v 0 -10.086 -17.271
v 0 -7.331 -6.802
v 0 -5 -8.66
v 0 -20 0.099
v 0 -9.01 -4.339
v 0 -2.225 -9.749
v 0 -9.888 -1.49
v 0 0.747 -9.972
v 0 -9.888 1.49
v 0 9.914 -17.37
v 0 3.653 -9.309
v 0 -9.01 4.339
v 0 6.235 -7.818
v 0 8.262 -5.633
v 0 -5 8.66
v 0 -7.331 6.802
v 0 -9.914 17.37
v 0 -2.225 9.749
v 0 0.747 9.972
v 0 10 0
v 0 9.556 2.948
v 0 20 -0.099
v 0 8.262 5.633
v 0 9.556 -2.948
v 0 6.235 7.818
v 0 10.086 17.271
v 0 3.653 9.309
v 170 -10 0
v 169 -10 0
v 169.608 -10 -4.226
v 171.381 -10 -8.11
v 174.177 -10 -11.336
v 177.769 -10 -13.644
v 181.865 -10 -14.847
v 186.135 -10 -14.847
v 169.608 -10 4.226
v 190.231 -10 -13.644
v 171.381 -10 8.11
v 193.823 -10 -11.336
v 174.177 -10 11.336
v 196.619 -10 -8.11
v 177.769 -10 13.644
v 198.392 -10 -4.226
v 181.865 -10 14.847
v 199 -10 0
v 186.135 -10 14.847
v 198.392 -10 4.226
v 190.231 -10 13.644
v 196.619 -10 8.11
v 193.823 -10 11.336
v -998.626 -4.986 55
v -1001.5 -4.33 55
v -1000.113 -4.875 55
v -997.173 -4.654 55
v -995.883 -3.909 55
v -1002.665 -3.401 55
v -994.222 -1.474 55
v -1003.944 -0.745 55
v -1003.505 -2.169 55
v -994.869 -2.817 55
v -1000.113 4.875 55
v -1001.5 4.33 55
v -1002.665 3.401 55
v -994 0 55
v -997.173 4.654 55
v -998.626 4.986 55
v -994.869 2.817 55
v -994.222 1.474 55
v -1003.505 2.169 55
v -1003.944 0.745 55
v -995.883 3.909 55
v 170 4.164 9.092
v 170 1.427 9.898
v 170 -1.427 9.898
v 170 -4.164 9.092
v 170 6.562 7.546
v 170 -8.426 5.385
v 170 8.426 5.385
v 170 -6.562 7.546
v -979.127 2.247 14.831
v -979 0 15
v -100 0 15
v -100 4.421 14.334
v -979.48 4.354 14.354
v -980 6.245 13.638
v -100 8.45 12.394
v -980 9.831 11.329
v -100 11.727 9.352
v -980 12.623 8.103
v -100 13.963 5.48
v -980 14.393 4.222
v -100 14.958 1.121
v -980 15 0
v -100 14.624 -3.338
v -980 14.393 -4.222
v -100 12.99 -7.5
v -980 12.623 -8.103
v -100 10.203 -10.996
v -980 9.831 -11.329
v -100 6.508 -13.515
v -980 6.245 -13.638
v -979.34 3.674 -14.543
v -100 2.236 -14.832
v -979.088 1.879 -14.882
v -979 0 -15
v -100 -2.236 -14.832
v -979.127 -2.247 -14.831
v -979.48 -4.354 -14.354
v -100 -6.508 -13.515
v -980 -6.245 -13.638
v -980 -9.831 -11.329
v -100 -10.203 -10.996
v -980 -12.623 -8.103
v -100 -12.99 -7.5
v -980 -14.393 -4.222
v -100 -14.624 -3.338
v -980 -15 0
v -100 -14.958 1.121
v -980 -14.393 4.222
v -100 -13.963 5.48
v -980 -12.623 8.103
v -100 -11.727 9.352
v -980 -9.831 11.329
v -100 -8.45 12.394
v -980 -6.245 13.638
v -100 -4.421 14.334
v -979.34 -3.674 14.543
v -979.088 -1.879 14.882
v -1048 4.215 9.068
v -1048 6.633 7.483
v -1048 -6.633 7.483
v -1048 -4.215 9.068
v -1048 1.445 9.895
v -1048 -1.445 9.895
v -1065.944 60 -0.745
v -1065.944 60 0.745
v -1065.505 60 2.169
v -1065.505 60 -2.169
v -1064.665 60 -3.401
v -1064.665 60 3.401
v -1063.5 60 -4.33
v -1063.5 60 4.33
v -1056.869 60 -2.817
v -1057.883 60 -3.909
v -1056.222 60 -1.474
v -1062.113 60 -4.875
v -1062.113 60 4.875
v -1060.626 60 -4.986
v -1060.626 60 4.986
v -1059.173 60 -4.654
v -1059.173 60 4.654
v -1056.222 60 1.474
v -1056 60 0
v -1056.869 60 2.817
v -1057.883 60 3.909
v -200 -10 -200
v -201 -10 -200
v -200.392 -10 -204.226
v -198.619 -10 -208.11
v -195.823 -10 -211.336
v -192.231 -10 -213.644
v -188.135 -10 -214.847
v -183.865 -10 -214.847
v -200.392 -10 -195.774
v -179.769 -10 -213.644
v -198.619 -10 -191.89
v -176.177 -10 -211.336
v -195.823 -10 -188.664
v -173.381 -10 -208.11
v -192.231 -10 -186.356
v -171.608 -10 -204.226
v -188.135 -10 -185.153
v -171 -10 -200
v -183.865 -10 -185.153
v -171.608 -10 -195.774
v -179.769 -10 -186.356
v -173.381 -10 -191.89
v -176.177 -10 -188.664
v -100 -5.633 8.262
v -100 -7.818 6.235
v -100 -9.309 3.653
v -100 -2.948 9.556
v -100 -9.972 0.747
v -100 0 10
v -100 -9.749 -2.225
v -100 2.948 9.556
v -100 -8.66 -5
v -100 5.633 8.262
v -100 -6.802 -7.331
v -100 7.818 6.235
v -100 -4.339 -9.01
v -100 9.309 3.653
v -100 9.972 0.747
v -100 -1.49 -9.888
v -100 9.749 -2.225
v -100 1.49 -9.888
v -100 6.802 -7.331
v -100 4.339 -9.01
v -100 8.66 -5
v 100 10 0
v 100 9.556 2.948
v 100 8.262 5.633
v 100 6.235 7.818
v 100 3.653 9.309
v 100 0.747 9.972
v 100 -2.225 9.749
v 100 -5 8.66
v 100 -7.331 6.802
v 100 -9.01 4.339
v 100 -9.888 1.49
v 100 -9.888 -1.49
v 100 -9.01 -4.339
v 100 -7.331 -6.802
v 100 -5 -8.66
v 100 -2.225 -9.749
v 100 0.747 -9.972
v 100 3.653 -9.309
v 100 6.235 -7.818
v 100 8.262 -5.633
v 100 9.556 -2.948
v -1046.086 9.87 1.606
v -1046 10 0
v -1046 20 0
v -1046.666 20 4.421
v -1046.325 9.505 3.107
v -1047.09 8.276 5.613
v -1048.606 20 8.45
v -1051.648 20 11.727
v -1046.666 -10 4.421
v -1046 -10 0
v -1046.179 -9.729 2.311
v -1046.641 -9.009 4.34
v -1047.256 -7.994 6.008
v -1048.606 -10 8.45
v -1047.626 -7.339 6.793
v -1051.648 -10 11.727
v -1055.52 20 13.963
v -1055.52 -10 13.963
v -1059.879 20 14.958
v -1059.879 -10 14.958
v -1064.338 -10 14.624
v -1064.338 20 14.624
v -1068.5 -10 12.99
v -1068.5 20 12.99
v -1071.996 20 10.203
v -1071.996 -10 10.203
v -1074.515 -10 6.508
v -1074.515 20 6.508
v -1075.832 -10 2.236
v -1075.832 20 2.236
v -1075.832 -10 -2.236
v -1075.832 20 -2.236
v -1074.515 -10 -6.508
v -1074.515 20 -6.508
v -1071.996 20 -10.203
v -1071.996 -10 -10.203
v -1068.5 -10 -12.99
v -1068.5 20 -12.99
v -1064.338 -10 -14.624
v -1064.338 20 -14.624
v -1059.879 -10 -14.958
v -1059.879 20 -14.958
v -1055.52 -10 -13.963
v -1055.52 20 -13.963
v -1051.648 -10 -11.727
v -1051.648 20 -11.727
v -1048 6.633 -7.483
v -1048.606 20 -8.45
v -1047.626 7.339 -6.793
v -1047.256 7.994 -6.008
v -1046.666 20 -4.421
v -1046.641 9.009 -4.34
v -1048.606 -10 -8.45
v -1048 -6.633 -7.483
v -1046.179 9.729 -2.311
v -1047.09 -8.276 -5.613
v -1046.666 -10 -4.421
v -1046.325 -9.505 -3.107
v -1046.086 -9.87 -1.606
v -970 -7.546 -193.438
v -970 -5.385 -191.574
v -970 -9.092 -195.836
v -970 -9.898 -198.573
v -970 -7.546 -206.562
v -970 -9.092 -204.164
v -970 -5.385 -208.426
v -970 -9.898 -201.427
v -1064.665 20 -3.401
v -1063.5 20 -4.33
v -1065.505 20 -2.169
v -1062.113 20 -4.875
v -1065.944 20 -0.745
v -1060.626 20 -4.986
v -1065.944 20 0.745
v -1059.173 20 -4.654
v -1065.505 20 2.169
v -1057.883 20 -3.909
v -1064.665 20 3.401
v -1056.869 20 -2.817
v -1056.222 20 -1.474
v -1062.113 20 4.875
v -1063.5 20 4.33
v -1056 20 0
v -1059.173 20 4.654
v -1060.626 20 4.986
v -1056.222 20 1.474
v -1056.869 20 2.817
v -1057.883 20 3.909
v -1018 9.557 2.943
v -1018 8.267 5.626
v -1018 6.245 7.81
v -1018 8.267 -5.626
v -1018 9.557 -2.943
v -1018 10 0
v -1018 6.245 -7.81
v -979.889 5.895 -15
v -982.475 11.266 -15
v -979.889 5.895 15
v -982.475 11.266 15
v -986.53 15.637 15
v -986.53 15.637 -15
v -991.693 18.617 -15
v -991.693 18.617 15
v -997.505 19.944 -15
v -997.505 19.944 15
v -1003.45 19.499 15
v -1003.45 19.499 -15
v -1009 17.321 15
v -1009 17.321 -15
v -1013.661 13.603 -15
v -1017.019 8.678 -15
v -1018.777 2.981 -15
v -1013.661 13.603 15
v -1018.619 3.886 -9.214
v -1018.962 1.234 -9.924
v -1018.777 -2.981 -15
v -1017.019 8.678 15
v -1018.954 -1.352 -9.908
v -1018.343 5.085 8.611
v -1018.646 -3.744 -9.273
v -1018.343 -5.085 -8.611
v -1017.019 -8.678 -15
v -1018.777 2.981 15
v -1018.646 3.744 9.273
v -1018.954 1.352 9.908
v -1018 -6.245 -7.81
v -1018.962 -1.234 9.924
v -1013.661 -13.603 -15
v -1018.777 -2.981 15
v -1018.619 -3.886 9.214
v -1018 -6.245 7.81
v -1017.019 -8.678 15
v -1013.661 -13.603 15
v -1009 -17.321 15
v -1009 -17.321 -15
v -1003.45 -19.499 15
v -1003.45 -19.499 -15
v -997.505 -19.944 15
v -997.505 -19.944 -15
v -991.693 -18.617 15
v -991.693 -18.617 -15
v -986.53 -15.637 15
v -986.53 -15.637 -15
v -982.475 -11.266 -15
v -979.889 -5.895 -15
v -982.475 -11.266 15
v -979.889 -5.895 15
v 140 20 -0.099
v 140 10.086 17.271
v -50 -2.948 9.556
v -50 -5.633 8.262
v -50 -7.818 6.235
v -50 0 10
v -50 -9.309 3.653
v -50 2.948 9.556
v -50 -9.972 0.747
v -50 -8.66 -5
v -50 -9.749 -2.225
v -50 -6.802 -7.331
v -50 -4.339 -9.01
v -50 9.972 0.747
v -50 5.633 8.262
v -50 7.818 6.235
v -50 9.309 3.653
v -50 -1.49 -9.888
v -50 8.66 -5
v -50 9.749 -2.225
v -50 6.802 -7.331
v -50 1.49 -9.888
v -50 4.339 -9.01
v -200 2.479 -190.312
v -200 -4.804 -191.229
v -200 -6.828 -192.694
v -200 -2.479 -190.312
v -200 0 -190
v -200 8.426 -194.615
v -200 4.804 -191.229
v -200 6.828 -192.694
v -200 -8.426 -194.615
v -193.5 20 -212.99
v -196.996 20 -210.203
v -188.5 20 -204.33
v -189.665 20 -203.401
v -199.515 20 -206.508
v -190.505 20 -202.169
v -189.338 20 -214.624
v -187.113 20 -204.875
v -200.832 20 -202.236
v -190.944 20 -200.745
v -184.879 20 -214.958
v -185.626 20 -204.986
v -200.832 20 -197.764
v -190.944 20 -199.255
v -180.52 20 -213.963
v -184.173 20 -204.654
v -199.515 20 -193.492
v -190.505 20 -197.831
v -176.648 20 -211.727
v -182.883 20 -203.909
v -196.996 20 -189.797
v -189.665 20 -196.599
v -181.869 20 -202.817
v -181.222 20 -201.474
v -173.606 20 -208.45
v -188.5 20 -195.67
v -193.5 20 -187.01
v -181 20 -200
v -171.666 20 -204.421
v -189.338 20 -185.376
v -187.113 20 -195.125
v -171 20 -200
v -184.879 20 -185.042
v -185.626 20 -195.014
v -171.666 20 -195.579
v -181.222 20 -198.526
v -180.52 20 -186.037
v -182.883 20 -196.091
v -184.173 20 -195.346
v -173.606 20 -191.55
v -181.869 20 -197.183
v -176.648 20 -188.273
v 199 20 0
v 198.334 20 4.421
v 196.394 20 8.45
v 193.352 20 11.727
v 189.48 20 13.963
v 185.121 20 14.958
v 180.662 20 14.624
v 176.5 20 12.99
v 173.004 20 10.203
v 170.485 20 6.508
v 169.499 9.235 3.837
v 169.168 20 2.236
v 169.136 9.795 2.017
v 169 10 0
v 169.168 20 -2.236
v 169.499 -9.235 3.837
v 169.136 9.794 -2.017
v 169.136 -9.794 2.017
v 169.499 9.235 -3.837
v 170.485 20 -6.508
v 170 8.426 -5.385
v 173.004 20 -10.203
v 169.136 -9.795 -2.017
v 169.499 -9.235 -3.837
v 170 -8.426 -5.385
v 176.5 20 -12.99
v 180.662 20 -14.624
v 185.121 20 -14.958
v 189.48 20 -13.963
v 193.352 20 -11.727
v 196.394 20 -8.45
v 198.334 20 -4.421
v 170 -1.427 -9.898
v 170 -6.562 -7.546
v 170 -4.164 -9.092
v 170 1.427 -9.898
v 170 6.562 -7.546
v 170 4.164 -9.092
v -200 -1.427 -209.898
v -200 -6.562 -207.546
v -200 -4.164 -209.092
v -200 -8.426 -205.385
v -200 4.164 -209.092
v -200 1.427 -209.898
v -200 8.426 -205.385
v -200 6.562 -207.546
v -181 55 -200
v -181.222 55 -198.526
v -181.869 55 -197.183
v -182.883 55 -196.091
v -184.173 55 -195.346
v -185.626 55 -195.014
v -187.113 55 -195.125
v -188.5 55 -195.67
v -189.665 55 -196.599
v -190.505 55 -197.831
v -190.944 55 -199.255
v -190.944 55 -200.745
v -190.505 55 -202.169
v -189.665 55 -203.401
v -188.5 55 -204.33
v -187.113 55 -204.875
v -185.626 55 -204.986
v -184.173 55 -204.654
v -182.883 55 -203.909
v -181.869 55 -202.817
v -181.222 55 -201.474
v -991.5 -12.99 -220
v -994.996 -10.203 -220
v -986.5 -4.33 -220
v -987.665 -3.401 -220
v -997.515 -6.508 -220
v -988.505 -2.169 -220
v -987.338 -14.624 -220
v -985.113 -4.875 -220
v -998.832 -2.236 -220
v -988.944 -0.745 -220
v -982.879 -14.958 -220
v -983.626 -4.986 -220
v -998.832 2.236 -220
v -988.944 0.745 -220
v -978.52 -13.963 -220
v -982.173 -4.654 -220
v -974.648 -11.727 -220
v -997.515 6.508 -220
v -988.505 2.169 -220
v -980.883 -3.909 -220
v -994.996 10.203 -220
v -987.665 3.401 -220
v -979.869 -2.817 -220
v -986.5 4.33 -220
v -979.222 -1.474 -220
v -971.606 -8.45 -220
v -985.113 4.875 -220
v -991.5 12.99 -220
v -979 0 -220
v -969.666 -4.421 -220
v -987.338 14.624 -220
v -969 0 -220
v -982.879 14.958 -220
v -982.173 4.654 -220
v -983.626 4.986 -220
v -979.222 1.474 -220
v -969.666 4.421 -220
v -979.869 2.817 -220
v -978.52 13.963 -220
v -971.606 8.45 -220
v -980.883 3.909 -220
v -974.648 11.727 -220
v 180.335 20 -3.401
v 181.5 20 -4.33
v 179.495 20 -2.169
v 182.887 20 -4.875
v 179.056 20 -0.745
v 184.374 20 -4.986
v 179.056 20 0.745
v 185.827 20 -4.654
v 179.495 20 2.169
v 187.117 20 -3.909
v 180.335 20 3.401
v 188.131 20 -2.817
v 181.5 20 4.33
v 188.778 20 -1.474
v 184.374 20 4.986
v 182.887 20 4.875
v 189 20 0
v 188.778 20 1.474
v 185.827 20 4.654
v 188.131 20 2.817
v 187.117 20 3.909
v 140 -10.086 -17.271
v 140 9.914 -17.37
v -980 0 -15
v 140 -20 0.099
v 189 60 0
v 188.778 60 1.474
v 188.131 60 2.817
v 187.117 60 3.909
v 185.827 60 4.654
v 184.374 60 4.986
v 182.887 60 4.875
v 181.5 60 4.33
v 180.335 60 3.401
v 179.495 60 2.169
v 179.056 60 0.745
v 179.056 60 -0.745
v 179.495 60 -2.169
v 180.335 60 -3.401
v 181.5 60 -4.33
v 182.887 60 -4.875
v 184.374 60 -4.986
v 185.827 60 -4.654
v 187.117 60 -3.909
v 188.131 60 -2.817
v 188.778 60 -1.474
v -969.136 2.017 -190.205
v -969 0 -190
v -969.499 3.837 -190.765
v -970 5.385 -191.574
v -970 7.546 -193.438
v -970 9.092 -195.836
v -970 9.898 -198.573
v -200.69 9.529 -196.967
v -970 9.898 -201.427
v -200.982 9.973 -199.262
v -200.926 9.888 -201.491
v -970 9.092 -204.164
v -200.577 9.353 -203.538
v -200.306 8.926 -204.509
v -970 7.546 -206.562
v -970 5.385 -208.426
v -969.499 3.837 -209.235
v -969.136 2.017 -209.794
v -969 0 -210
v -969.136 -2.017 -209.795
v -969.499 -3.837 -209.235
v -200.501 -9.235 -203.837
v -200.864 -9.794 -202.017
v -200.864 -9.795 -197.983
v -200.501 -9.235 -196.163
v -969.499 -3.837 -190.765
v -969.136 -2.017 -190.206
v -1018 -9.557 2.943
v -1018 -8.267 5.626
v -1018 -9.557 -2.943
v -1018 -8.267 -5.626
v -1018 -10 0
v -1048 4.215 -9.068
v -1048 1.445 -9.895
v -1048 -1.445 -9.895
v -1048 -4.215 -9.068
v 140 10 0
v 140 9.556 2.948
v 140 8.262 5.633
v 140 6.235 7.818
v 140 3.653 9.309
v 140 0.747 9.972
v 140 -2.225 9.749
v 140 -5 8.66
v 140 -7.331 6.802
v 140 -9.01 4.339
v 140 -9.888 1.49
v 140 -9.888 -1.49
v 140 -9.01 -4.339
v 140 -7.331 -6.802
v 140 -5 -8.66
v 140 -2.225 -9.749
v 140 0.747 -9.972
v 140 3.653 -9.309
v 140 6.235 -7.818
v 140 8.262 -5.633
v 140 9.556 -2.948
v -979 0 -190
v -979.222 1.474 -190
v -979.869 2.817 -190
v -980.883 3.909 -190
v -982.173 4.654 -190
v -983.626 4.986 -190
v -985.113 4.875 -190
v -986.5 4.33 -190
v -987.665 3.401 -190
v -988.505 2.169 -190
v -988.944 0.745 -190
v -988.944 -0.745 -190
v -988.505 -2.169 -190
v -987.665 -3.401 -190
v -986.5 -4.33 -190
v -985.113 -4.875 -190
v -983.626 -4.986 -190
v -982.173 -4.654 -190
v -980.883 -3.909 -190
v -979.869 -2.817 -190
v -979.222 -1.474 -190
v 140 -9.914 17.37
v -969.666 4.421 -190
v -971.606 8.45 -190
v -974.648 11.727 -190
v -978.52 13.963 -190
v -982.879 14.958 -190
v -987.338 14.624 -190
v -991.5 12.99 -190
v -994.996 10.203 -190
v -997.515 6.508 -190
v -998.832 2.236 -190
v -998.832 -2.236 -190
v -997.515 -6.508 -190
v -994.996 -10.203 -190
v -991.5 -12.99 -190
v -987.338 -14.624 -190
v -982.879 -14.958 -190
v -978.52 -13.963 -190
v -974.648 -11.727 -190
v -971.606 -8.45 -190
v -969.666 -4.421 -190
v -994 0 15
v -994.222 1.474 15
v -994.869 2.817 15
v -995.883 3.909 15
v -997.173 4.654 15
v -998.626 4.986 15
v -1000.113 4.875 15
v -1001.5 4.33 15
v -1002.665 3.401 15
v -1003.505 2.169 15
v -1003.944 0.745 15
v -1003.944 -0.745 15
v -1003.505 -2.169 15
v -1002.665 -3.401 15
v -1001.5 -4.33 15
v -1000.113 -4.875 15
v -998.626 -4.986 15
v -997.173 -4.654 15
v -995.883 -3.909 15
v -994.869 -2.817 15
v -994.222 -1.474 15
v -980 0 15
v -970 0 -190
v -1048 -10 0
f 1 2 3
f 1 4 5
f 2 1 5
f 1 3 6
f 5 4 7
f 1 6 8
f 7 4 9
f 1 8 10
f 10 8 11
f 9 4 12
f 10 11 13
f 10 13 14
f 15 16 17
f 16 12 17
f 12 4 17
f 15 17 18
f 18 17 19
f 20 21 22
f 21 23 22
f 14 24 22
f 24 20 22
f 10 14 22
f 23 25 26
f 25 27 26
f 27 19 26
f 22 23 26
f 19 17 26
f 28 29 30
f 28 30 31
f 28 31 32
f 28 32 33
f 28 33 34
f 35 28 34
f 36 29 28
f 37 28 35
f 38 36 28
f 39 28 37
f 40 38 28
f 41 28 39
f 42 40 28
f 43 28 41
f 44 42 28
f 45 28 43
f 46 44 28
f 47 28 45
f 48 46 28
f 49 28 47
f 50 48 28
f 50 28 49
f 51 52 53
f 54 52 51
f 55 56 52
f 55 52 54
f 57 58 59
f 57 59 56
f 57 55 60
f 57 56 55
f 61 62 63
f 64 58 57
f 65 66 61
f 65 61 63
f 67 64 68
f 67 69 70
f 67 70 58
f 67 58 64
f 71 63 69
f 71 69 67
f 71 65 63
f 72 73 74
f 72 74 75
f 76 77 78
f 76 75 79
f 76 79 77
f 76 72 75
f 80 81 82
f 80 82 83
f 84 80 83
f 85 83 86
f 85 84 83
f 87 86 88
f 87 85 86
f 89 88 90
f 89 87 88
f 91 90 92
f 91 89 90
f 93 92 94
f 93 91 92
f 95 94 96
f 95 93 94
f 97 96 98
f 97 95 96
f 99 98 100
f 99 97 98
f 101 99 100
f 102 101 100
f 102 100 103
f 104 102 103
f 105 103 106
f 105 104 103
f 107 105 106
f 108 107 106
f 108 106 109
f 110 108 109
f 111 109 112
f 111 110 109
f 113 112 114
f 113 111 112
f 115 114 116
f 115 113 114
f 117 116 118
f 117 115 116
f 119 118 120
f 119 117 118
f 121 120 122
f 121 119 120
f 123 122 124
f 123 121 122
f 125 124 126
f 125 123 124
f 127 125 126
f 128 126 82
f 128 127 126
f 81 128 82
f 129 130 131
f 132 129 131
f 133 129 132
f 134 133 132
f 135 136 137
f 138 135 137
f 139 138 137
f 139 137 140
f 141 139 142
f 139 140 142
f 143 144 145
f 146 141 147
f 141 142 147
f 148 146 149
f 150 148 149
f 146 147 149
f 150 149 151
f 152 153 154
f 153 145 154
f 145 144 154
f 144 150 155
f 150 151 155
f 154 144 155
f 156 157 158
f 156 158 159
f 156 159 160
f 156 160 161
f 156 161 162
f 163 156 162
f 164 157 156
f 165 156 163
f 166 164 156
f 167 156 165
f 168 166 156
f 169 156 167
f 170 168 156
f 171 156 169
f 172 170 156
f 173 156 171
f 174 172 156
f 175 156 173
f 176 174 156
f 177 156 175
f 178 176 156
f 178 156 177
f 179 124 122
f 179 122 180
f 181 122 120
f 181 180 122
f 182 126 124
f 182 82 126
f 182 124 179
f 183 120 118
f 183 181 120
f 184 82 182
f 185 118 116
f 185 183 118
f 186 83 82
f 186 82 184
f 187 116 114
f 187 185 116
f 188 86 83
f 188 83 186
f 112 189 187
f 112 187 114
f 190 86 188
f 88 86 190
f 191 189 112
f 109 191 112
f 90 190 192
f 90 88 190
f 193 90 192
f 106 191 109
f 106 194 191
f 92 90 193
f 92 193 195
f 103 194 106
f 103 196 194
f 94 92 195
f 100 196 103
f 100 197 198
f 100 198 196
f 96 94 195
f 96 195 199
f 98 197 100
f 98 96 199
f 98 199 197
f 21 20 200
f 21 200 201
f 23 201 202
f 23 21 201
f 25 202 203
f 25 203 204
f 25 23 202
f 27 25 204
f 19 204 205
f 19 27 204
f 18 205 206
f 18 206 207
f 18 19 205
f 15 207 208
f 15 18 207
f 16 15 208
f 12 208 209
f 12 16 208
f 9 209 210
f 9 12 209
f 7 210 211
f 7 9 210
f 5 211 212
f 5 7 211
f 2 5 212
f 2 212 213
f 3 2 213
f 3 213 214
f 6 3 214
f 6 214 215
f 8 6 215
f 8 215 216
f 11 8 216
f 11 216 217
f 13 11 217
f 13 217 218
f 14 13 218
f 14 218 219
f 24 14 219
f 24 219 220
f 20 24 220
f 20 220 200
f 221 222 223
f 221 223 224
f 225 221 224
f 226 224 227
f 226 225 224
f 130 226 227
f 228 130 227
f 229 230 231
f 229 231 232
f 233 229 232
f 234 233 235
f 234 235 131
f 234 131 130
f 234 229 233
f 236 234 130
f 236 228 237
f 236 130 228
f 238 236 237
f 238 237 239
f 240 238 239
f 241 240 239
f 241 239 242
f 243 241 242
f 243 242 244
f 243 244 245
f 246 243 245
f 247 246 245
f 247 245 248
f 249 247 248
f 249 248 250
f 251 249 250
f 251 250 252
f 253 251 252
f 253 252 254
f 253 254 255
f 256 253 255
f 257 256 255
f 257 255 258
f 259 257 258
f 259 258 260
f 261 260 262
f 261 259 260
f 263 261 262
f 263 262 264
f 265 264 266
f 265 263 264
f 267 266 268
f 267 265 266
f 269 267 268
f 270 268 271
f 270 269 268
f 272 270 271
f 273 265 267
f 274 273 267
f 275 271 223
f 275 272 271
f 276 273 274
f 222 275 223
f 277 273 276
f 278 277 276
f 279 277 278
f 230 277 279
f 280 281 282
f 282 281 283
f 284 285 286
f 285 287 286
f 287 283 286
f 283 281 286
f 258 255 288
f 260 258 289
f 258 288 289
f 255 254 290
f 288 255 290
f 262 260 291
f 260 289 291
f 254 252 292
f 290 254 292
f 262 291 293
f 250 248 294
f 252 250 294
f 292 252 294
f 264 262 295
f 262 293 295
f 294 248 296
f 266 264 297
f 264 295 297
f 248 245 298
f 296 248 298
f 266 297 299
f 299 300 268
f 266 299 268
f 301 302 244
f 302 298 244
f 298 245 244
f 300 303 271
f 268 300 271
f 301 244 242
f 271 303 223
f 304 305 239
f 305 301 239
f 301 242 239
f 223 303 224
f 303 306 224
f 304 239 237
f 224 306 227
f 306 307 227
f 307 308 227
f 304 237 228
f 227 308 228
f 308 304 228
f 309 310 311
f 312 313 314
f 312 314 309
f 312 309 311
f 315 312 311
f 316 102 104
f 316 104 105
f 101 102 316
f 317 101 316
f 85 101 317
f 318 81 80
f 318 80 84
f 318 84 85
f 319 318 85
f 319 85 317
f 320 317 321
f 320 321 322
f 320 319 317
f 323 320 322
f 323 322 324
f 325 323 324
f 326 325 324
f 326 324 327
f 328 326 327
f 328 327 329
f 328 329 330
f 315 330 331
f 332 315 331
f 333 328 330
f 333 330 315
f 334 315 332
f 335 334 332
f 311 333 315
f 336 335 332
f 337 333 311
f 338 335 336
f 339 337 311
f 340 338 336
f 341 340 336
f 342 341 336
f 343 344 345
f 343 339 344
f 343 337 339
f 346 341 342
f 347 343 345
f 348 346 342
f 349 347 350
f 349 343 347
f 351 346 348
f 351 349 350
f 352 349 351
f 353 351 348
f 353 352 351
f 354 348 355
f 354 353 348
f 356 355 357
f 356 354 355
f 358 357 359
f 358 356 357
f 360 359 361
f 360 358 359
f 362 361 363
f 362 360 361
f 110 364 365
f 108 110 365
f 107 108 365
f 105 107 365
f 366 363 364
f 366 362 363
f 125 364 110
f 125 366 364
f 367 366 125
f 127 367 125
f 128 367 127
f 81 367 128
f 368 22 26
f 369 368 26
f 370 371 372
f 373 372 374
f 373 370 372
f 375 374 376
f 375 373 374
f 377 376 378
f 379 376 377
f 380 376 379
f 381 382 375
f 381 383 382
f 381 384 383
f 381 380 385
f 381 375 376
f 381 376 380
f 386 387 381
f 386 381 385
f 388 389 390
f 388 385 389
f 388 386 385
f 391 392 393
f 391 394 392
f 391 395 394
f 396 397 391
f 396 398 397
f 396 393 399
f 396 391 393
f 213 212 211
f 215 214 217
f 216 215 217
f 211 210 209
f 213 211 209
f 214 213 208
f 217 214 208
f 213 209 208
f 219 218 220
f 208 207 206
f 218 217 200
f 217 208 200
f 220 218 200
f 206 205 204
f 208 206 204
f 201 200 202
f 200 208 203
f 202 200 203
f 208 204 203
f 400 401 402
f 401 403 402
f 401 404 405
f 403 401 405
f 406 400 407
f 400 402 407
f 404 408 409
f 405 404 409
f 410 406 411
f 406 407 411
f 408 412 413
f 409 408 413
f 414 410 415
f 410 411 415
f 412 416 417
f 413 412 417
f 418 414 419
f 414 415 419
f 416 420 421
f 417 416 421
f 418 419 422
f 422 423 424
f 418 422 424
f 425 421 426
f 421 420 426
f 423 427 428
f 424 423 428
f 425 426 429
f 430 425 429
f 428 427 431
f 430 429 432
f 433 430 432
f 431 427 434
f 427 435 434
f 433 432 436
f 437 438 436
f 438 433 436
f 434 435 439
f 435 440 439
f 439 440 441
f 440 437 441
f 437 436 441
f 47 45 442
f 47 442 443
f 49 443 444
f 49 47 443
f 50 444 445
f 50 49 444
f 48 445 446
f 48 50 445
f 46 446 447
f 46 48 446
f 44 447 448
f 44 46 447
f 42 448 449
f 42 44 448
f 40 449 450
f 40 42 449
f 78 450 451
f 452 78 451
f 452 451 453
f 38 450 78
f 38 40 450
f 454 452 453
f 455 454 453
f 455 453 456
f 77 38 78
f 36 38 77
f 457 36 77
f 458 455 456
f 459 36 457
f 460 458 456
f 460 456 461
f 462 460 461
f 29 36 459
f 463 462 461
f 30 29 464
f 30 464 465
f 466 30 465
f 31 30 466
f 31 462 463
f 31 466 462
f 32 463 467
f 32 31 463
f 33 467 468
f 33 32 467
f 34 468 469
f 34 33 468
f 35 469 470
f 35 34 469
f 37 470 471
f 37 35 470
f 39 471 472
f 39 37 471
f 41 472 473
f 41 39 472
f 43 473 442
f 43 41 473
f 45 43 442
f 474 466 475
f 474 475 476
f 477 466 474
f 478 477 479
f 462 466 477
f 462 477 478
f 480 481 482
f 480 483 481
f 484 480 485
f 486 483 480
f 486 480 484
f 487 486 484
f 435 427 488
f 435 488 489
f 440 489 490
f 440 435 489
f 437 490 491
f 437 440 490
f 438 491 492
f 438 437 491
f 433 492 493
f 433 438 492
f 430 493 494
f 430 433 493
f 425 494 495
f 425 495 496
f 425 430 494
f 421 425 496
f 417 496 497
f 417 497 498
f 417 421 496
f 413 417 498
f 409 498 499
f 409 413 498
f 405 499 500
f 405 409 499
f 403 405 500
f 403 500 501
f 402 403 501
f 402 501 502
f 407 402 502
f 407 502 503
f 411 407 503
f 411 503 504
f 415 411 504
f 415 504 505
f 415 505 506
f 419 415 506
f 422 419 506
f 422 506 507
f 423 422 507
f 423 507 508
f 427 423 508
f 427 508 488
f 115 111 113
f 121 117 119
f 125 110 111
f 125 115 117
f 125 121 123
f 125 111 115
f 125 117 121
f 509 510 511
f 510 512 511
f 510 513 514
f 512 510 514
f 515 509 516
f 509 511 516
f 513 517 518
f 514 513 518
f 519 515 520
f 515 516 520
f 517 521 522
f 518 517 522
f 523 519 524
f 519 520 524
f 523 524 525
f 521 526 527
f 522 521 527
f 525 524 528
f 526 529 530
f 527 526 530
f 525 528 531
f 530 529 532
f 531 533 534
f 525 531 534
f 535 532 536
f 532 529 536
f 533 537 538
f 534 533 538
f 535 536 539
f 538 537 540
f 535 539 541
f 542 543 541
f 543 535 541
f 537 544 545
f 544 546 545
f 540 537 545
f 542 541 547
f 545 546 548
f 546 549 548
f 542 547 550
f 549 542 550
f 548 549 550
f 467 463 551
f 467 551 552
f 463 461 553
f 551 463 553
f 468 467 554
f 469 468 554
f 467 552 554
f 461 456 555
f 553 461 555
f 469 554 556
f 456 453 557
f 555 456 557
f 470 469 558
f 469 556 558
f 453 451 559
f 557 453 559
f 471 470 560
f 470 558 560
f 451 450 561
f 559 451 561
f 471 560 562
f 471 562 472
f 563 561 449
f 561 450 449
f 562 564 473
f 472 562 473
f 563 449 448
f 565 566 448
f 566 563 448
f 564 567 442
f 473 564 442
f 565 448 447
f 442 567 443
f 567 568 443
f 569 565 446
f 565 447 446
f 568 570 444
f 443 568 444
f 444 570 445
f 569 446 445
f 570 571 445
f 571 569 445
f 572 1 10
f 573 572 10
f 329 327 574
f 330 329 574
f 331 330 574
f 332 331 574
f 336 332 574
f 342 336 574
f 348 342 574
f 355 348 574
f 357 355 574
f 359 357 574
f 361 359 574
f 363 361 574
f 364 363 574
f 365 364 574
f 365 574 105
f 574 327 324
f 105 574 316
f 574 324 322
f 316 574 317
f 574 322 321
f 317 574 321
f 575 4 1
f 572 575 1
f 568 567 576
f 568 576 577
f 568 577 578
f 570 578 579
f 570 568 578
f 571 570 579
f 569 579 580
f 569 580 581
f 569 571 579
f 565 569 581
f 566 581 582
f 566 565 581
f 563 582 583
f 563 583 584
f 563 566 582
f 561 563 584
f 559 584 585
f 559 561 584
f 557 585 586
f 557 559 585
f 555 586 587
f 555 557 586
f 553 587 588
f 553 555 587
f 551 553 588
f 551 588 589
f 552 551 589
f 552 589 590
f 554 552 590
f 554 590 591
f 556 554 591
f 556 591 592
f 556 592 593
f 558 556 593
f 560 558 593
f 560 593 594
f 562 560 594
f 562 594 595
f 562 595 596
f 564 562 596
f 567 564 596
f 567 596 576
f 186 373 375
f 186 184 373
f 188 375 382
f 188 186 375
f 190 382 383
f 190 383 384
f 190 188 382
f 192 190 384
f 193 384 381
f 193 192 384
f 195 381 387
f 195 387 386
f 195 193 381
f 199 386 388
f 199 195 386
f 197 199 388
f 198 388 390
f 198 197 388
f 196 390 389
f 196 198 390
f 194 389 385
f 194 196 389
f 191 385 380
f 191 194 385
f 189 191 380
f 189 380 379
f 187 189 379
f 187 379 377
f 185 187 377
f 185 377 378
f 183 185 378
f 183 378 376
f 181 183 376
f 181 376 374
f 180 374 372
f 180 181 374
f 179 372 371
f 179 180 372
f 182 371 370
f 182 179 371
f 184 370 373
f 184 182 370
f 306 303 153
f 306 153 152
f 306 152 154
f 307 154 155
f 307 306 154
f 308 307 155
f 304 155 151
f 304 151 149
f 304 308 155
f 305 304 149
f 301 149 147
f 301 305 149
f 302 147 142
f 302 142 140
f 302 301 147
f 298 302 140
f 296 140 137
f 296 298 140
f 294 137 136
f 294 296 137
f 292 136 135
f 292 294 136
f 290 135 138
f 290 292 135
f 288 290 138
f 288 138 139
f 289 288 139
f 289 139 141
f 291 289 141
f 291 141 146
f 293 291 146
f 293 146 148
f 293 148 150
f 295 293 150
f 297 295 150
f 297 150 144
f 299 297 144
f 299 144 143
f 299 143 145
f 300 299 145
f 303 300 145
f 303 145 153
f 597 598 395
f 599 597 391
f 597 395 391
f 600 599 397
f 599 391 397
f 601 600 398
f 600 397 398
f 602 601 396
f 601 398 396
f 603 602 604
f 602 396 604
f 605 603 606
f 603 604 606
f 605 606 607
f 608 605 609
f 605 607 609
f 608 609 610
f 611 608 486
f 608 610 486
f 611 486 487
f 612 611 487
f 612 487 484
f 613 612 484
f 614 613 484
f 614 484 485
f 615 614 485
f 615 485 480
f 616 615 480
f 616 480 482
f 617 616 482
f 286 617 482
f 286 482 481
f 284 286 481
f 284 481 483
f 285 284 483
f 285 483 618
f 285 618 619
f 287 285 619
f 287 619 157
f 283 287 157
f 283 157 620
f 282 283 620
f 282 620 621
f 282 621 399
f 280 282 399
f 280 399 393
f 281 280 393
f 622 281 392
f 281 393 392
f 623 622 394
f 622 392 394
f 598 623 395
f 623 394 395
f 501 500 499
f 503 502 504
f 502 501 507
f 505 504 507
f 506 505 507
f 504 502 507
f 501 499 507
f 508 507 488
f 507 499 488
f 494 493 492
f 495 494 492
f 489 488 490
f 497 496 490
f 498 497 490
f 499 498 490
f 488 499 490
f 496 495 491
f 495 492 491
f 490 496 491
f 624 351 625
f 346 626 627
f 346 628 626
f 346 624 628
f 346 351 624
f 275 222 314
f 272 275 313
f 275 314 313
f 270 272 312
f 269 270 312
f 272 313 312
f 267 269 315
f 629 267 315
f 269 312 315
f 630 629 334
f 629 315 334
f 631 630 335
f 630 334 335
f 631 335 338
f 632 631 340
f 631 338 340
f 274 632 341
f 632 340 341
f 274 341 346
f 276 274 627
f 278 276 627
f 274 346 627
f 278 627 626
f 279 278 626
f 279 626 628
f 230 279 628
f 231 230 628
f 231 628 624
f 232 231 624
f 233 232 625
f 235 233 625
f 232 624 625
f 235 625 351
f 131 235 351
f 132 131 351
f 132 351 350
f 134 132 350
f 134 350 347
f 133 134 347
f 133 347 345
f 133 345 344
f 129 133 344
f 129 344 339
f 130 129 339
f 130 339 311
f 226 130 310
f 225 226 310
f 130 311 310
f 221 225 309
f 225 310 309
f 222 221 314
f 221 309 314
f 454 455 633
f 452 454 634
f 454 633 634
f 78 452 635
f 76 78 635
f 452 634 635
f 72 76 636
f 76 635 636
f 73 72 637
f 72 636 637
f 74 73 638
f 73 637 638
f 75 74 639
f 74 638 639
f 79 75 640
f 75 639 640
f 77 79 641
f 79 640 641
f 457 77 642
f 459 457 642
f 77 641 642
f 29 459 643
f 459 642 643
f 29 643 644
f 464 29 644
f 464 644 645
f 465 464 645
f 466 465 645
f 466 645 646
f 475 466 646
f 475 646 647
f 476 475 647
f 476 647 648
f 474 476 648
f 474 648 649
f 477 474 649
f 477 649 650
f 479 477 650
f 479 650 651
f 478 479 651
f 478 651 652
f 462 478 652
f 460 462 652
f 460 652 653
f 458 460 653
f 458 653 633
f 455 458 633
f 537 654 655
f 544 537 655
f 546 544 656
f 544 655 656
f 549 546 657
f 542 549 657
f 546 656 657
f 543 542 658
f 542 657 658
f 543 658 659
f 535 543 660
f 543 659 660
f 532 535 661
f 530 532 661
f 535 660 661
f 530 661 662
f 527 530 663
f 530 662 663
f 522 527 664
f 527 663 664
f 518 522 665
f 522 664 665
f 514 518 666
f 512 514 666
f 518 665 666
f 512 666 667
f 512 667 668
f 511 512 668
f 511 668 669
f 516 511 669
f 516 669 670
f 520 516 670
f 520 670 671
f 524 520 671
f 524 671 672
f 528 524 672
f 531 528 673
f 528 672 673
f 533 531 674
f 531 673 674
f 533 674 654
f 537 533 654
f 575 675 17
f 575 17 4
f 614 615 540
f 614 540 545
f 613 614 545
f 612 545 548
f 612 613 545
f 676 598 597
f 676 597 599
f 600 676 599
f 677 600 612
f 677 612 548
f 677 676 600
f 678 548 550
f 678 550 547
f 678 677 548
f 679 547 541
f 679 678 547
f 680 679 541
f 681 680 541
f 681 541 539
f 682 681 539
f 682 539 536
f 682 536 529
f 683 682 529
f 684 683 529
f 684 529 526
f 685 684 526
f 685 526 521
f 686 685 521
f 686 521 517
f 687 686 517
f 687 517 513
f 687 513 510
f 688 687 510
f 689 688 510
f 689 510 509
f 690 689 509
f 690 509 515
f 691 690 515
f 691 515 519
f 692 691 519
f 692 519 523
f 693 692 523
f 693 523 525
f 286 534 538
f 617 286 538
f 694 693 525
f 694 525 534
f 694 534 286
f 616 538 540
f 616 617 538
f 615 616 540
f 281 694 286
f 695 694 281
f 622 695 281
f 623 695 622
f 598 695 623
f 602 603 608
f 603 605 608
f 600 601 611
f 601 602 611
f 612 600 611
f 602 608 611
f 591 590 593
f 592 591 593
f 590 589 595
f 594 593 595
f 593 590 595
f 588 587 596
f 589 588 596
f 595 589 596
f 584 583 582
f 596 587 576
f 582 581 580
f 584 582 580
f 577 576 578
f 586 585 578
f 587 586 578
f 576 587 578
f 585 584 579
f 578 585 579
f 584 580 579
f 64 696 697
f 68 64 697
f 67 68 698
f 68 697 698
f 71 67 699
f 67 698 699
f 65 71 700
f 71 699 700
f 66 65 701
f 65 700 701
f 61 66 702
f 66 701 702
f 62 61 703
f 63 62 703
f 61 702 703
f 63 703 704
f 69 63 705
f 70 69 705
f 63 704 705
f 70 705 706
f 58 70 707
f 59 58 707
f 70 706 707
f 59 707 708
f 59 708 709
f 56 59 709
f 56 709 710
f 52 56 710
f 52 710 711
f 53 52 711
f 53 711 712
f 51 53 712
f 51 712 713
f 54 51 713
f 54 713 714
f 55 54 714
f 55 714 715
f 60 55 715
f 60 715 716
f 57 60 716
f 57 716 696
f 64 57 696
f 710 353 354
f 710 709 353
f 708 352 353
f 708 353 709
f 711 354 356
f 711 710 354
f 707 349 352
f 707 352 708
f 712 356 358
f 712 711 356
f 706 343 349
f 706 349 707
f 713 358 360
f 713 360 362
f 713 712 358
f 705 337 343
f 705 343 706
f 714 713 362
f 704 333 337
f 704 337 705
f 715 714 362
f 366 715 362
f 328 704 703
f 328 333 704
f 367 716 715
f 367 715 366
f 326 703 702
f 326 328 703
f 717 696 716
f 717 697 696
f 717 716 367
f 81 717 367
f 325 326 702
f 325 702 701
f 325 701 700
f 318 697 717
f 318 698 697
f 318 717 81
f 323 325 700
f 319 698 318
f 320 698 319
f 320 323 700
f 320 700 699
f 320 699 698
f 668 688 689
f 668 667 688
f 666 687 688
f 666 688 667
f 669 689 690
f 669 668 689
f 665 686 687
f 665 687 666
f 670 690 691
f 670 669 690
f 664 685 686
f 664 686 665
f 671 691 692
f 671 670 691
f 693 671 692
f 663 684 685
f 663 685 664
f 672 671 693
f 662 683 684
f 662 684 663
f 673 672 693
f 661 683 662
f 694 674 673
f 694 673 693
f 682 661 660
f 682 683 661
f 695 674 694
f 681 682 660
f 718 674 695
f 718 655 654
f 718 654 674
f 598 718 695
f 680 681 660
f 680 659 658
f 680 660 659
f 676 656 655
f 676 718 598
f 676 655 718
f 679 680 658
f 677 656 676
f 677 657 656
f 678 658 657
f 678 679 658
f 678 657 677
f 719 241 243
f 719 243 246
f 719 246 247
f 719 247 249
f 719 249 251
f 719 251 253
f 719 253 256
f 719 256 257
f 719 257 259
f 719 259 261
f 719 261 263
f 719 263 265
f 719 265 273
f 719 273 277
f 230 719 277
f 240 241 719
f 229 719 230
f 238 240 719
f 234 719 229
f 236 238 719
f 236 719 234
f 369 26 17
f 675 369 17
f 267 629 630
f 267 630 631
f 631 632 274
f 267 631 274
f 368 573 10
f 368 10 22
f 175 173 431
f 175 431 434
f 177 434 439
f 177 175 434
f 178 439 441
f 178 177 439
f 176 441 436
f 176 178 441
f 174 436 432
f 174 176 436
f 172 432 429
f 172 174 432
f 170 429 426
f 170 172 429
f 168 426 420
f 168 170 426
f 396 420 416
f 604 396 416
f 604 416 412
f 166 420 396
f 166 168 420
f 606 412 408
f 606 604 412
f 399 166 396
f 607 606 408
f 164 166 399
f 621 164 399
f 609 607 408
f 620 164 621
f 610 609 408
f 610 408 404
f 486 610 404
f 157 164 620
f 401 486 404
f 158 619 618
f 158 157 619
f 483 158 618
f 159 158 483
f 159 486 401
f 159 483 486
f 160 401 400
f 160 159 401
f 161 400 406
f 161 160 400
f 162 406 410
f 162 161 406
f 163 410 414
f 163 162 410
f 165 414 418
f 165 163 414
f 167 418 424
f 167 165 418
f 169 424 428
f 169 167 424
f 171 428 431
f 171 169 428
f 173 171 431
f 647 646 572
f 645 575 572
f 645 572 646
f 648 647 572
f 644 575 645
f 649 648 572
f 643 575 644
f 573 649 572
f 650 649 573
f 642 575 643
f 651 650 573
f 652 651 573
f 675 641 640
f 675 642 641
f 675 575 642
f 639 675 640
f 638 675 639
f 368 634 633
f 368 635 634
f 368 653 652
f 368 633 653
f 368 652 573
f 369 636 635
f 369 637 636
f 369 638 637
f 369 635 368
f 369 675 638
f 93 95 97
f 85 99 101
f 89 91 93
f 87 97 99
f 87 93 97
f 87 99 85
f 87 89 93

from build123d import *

# Parameters (mm, degrees)
F0_R      = 10
F1_DEPTH  = 140
F3_R      = 10
F4_DEPTH  = 70
F7_DEPTH  = 30
F9_DEPTH  = 60
F13_R     = 20
F14_DEPTH = 30
F15_R     = 5
F16_DEPTH = 55
F17_W     = 30
F17_H     = 10
F19_R     = 15
F20_DEPTH = 30
F21_R     = 5
F22_DEPTH = 60
F23_W     = 770
F23_H     = 10
F25_R     = 15
F26_DEPTH = 30
F27_R     = 5
F28_DEPTH = 55
F30_R     = 15
F30_R_2   = 5
F31_DEPTH = 30


with BuildPart() as f1:
    # F0 (on Right) → F1 (new body)
    with BuildSketch(Plane.YZ):
        Polygon((19.9997544387, -0.0991079843), (10.0857072515, 17.2707414212), (-9.9140471872, 17.3698494055), (-19.9997544387, 0.0991079843), (-10.0857072515, -17.2707414212), (9.9140471872, -17.3698494055), align=None)
        Circle(F0_R, mode=Mode.SUBTRACT)
    extrude(amount=F1_DEPTH)

    # F3 (on offset) → F4 (join)
    with BuildSketch(Plane.YZ.offset(100)):
        Circle(F3_R)
    extrude(amount=F4_DEPTH)

    # F6 (on offset) → F7 (join)
    with BuildSketch(Plane.XZ.offset(10)):
        with BuildLine():
            ThreePointArc((169, 0), (184, -15), (199, 0))
            ThreePointArc((199, 0), (184, 15), (169, 0))
        make_face()
    extrude(amount=-F7_DEPTH)

    # F8 (on Front) → F9 (join)
    with BuildSketch(Plane.XZ):
        with BuildLine():
            ThreePointArc((179, 0), (184, -5), (189, 0))
            ThreePointArc((189, 0), (184, 5), (179, 0))
        make_face()
    extrude(amount=-F9_DEPTH)


with BuildPart() as f11:
    # F10 (on Front) → F11 (revolve)
    with BuildSketch(Plane.XZ):
        Polygon((-980, 0), (-50, 0), (-50, 10), (-100, 10), (-100, 15), (-980, 15), align=None)
    revolve(axis=Axis((-515, 0, 0), (-1, 0, 0)))

    # F13 (on offset) → F14 (join)
    with BuildSketch(Plane.XY.offset(15)):
        with Locations((-999, 0)):
            Circle(F13_R)
    extrude(amount=-F14_DEPTH)

    # F15 (on Top) → F16 (join)
    with BuildSketch(Plane.XY):
        with Locations((-999, 0)):
            Circle(F15_R)
    extrude(amount=F16_DEPTH)

    # F17 (on Top) → F18 (revolve)
    with BuildSketch(Plane.XY):
        with Locations((-1033, 5)):
            Rectangle(F17_W, F17_H)
    revolve(axis=Axis((-1033, 0, 0), (-1, 0, 0)))

    # F19 (on offset) → F20 (join)
    with BuildSketch(Plane.XZ.offset(10)):
        with Locations((-1061, 0)):
            Circle(F19_R)
    extrude(amount=-F20_DEPTH)

    # F21 (on Front) → F22 (join)
    with BuildSketch(Plane.XZ):
        with Locations((-1061, 0)):
            Circle(F21_R)
    extrude(amount=-F22_DEPTH)


with BuildPart() as f24:
    # F23 (on Front) → F24 (revolve)
    with BuildSketch(Plane.XZ):
        with Locations((-585, -195)):
            Rectangle(F23_W, F23_H)
    revolve(axis=Axis((-585, 0, -200), (-1, 0, 0)))

    # F25 (on offset) → F26 (join)
    with BuildSketch(Plane.XZ.offset(10)):
        with Locations((-186, -200)):
            Circle(F25_R)
    extrude(amount=-F26_DEPTH)

    # F27 (on Front) → F28 (join)
    with BuildSketch(Plane.XZ):
        with Locations((-186, -200)):
            Circle(F27_R)
    extrude(amount=-F28_DEPTH)

    # F30 (on offset) → F31 (join)
    with BuildSketch(Plane.XY.offset(-190)):
        with Locations((-984, 0)):
            Circle(F30_R)
        with Locations((-984, 0)):
            Circle(F30_R_2, mode=Mode.SUBTRACT)
    extrude(amount=-F31_DEPTH)


solid = Compound([f1.part, f11.part, f24.part])
